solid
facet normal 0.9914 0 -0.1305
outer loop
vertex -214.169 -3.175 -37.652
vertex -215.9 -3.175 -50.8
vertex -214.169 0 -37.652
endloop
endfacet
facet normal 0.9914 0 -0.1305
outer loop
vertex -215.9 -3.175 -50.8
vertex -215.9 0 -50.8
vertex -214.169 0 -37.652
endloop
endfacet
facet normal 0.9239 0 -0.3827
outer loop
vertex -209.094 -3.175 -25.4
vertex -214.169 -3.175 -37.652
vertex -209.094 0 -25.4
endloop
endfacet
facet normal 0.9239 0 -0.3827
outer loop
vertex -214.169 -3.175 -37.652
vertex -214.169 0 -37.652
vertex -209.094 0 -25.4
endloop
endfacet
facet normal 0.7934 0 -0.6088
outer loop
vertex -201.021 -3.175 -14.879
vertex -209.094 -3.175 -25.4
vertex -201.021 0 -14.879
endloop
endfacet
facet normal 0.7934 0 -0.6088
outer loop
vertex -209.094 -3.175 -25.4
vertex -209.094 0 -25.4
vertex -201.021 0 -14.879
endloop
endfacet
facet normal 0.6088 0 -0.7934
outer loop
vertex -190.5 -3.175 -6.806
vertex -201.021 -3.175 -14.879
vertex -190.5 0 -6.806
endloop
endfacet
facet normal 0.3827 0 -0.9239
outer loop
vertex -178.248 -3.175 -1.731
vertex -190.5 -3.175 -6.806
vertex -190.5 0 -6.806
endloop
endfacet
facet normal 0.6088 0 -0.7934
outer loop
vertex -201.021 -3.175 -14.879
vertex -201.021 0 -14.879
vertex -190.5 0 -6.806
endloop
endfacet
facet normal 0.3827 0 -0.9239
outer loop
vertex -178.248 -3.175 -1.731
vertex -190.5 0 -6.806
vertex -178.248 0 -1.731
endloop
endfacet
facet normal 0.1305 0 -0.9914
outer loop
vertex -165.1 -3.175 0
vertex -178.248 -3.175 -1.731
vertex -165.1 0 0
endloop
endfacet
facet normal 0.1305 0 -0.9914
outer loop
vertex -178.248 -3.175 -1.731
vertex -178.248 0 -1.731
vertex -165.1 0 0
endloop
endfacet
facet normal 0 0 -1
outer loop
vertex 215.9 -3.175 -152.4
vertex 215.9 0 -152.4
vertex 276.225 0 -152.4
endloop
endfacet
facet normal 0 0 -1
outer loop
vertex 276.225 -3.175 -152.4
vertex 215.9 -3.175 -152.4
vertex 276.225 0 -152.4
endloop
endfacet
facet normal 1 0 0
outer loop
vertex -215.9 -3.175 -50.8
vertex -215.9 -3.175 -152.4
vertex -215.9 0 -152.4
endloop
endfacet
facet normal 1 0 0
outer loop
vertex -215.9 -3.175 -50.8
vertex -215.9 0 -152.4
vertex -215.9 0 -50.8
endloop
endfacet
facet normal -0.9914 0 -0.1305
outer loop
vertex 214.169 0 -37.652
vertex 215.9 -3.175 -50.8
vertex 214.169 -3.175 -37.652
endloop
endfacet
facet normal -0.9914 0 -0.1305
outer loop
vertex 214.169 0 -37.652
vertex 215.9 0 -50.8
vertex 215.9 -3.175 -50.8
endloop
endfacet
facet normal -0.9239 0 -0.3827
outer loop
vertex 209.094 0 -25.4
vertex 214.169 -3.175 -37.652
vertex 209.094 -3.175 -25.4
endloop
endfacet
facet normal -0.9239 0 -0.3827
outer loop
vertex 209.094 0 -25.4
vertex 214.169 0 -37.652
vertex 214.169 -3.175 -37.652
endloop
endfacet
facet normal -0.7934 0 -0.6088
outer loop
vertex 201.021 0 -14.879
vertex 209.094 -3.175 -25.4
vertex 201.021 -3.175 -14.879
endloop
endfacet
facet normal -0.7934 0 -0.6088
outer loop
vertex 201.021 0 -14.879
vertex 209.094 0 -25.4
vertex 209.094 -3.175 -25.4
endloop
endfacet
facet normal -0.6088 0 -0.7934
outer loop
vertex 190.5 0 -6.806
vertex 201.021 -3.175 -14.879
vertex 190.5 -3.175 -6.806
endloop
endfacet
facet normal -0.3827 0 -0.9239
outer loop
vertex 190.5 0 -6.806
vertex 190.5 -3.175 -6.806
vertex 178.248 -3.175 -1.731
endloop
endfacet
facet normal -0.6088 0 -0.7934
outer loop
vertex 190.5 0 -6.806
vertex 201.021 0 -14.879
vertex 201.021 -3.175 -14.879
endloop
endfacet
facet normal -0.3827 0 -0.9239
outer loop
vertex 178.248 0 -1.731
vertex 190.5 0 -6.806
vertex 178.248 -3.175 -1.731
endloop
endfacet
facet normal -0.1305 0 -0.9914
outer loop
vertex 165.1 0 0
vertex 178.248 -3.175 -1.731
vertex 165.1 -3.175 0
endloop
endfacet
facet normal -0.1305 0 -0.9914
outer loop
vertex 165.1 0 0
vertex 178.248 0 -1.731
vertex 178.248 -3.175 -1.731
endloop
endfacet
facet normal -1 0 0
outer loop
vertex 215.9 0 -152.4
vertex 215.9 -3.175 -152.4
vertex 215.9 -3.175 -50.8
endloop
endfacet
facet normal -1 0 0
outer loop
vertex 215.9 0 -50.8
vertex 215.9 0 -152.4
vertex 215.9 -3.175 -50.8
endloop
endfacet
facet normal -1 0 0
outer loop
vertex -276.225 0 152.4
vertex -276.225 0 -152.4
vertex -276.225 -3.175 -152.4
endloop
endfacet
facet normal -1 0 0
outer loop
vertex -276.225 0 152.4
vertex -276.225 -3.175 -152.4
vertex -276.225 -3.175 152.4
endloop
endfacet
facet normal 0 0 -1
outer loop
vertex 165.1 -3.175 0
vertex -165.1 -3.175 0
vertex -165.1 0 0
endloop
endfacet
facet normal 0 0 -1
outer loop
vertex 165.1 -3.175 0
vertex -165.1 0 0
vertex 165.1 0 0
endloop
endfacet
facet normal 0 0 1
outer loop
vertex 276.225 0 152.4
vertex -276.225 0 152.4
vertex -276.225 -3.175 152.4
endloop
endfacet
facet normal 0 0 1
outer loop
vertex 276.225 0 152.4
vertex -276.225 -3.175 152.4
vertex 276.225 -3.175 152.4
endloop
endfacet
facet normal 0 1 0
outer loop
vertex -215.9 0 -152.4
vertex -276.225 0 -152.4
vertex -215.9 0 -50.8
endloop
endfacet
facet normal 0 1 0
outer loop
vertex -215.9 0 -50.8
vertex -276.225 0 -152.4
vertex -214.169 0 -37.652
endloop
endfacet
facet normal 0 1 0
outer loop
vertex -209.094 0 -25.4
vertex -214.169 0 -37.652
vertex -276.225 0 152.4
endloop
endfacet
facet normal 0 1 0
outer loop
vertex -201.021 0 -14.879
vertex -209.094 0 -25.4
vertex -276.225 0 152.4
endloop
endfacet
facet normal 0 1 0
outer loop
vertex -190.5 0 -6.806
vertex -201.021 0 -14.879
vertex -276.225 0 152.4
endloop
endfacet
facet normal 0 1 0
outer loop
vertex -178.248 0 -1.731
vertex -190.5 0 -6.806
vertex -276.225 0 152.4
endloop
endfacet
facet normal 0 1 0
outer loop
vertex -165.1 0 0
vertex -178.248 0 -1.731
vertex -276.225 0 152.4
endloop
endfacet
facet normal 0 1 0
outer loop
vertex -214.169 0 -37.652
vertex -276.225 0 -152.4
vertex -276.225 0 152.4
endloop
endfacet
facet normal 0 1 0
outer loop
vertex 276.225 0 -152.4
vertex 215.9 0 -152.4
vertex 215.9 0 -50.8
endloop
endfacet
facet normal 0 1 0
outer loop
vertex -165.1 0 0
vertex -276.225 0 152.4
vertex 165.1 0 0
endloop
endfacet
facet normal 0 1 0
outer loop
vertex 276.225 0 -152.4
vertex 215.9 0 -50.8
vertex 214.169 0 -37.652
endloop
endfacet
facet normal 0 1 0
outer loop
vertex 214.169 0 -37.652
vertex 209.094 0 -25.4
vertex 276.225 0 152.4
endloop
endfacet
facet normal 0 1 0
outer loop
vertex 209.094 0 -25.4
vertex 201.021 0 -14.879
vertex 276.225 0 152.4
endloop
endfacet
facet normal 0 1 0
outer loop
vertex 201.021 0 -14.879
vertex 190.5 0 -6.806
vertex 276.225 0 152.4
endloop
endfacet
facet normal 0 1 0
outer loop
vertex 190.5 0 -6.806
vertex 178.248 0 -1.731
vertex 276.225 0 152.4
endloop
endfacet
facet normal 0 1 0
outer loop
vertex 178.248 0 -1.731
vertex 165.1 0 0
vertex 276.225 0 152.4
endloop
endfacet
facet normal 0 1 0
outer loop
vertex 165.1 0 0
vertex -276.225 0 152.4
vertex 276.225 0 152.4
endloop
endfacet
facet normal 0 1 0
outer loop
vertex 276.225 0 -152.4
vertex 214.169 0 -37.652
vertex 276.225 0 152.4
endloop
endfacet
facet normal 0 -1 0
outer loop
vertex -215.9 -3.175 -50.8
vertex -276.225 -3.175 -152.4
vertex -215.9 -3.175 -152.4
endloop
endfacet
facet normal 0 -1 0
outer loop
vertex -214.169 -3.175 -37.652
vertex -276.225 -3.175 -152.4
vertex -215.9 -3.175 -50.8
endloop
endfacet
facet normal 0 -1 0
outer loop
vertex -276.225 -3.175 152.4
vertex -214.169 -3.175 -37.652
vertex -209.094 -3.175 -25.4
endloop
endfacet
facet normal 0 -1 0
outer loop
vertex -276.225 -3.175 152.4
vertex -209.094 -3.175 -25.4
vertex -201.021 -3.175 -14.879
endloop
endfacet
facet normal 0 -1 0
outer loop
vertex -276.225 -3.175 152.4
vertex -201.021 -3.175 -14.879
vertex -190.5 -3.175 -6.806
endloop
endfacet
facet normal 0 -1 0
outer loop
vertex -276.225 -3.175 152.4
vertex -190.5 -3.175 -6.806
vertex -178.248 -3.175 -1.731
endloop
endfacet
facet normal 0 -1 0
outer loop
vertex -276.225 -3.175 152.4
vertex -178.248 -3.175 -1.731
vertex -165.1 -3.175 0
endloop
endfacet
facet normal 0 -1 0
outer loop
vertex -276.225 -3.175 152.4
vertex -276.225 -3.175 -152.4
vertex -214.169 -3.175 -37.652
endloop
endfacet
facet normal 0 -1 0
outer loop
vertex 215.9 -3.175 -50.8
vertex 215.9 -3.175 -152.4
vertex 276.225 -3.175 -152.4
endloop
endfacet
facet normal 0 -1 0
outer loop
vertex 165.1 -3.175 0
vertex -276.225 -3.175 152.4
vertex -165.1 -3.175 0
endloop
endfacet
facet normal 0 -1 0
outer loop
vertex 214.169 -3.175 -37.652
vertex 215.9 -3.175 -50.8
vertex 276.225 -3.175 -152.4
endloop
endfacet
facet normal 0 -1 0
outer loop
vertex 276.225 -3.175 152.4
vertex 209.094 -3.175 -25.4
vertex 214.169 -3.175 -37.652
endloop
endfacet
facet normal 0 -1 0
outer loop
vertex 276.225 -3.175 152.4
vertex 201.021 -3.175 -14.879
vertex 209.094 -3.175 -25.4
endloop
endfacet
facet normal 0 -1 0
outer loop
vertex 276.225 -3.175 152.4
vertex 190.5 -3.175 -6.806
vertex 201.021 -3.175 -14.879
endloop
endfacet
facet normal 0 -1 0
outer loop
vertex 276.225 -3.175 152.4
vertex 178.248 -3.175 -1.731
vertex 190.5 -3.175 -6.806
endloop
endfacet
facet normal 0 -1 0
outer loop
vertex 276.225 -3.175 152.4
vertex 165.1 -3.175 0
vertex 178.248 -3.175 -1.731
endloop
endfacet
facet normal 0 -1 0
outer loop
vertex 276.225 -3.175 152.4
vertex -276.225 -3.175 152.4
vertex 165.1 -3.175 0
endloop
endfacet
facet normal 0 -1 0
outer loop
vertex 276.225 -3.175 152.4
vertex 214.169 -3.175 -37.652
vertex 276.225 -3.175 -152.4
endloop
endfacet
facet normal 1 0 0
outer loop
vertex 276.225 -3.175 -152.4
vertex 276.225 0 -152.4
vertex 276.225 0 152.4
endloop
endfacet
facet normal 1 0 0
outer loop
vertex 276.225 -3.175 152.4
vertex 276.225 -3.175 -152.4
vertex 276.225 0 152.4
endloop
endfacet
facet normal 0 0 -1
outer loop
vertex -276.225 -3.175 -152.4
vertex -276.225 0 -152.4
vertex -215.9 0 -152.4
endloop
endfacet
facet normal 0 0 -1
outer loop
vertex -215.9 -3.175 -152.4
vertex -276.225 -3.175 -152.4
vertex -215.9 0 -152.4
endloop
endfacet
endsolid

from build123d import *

# Parameters (mm, degrees)
F0_W     = 552.45
F0_H     = 304.8
F1_DEPTH = 3.175
F2_W     = 431.8
F2_H     = 152.4
F3_DEPTH = 3.176
F4_R     = 50.8


with BuildPart() as f1:
    # F0 (on Front) → F1 (new body)
    with BuildSketch(Plane.XZ):
        Rectangle(F0_W, F0_H)
    extrude(amount=F1_DEPTH)

    # F2 (on face) → F3 (cut, through all)
    with BuildSketch(Plane.XZ.offset(3.175)):
        with Locations((0, -76.2)):
            Rectangle(F2_W, F2_H)
    extrude(amount=-F3_DEPTH, mode=Mode.SUBTRACT)

    # F4
    f4_edges = [f1.edges().sort_by_distance(p)[0] for p in [
        (-215.9, -1.5875, 0),
        (215.9, -1.5875, 0),
    ]]
    fillet(f4_edges, radius=F4_R)


solid = f1.part
